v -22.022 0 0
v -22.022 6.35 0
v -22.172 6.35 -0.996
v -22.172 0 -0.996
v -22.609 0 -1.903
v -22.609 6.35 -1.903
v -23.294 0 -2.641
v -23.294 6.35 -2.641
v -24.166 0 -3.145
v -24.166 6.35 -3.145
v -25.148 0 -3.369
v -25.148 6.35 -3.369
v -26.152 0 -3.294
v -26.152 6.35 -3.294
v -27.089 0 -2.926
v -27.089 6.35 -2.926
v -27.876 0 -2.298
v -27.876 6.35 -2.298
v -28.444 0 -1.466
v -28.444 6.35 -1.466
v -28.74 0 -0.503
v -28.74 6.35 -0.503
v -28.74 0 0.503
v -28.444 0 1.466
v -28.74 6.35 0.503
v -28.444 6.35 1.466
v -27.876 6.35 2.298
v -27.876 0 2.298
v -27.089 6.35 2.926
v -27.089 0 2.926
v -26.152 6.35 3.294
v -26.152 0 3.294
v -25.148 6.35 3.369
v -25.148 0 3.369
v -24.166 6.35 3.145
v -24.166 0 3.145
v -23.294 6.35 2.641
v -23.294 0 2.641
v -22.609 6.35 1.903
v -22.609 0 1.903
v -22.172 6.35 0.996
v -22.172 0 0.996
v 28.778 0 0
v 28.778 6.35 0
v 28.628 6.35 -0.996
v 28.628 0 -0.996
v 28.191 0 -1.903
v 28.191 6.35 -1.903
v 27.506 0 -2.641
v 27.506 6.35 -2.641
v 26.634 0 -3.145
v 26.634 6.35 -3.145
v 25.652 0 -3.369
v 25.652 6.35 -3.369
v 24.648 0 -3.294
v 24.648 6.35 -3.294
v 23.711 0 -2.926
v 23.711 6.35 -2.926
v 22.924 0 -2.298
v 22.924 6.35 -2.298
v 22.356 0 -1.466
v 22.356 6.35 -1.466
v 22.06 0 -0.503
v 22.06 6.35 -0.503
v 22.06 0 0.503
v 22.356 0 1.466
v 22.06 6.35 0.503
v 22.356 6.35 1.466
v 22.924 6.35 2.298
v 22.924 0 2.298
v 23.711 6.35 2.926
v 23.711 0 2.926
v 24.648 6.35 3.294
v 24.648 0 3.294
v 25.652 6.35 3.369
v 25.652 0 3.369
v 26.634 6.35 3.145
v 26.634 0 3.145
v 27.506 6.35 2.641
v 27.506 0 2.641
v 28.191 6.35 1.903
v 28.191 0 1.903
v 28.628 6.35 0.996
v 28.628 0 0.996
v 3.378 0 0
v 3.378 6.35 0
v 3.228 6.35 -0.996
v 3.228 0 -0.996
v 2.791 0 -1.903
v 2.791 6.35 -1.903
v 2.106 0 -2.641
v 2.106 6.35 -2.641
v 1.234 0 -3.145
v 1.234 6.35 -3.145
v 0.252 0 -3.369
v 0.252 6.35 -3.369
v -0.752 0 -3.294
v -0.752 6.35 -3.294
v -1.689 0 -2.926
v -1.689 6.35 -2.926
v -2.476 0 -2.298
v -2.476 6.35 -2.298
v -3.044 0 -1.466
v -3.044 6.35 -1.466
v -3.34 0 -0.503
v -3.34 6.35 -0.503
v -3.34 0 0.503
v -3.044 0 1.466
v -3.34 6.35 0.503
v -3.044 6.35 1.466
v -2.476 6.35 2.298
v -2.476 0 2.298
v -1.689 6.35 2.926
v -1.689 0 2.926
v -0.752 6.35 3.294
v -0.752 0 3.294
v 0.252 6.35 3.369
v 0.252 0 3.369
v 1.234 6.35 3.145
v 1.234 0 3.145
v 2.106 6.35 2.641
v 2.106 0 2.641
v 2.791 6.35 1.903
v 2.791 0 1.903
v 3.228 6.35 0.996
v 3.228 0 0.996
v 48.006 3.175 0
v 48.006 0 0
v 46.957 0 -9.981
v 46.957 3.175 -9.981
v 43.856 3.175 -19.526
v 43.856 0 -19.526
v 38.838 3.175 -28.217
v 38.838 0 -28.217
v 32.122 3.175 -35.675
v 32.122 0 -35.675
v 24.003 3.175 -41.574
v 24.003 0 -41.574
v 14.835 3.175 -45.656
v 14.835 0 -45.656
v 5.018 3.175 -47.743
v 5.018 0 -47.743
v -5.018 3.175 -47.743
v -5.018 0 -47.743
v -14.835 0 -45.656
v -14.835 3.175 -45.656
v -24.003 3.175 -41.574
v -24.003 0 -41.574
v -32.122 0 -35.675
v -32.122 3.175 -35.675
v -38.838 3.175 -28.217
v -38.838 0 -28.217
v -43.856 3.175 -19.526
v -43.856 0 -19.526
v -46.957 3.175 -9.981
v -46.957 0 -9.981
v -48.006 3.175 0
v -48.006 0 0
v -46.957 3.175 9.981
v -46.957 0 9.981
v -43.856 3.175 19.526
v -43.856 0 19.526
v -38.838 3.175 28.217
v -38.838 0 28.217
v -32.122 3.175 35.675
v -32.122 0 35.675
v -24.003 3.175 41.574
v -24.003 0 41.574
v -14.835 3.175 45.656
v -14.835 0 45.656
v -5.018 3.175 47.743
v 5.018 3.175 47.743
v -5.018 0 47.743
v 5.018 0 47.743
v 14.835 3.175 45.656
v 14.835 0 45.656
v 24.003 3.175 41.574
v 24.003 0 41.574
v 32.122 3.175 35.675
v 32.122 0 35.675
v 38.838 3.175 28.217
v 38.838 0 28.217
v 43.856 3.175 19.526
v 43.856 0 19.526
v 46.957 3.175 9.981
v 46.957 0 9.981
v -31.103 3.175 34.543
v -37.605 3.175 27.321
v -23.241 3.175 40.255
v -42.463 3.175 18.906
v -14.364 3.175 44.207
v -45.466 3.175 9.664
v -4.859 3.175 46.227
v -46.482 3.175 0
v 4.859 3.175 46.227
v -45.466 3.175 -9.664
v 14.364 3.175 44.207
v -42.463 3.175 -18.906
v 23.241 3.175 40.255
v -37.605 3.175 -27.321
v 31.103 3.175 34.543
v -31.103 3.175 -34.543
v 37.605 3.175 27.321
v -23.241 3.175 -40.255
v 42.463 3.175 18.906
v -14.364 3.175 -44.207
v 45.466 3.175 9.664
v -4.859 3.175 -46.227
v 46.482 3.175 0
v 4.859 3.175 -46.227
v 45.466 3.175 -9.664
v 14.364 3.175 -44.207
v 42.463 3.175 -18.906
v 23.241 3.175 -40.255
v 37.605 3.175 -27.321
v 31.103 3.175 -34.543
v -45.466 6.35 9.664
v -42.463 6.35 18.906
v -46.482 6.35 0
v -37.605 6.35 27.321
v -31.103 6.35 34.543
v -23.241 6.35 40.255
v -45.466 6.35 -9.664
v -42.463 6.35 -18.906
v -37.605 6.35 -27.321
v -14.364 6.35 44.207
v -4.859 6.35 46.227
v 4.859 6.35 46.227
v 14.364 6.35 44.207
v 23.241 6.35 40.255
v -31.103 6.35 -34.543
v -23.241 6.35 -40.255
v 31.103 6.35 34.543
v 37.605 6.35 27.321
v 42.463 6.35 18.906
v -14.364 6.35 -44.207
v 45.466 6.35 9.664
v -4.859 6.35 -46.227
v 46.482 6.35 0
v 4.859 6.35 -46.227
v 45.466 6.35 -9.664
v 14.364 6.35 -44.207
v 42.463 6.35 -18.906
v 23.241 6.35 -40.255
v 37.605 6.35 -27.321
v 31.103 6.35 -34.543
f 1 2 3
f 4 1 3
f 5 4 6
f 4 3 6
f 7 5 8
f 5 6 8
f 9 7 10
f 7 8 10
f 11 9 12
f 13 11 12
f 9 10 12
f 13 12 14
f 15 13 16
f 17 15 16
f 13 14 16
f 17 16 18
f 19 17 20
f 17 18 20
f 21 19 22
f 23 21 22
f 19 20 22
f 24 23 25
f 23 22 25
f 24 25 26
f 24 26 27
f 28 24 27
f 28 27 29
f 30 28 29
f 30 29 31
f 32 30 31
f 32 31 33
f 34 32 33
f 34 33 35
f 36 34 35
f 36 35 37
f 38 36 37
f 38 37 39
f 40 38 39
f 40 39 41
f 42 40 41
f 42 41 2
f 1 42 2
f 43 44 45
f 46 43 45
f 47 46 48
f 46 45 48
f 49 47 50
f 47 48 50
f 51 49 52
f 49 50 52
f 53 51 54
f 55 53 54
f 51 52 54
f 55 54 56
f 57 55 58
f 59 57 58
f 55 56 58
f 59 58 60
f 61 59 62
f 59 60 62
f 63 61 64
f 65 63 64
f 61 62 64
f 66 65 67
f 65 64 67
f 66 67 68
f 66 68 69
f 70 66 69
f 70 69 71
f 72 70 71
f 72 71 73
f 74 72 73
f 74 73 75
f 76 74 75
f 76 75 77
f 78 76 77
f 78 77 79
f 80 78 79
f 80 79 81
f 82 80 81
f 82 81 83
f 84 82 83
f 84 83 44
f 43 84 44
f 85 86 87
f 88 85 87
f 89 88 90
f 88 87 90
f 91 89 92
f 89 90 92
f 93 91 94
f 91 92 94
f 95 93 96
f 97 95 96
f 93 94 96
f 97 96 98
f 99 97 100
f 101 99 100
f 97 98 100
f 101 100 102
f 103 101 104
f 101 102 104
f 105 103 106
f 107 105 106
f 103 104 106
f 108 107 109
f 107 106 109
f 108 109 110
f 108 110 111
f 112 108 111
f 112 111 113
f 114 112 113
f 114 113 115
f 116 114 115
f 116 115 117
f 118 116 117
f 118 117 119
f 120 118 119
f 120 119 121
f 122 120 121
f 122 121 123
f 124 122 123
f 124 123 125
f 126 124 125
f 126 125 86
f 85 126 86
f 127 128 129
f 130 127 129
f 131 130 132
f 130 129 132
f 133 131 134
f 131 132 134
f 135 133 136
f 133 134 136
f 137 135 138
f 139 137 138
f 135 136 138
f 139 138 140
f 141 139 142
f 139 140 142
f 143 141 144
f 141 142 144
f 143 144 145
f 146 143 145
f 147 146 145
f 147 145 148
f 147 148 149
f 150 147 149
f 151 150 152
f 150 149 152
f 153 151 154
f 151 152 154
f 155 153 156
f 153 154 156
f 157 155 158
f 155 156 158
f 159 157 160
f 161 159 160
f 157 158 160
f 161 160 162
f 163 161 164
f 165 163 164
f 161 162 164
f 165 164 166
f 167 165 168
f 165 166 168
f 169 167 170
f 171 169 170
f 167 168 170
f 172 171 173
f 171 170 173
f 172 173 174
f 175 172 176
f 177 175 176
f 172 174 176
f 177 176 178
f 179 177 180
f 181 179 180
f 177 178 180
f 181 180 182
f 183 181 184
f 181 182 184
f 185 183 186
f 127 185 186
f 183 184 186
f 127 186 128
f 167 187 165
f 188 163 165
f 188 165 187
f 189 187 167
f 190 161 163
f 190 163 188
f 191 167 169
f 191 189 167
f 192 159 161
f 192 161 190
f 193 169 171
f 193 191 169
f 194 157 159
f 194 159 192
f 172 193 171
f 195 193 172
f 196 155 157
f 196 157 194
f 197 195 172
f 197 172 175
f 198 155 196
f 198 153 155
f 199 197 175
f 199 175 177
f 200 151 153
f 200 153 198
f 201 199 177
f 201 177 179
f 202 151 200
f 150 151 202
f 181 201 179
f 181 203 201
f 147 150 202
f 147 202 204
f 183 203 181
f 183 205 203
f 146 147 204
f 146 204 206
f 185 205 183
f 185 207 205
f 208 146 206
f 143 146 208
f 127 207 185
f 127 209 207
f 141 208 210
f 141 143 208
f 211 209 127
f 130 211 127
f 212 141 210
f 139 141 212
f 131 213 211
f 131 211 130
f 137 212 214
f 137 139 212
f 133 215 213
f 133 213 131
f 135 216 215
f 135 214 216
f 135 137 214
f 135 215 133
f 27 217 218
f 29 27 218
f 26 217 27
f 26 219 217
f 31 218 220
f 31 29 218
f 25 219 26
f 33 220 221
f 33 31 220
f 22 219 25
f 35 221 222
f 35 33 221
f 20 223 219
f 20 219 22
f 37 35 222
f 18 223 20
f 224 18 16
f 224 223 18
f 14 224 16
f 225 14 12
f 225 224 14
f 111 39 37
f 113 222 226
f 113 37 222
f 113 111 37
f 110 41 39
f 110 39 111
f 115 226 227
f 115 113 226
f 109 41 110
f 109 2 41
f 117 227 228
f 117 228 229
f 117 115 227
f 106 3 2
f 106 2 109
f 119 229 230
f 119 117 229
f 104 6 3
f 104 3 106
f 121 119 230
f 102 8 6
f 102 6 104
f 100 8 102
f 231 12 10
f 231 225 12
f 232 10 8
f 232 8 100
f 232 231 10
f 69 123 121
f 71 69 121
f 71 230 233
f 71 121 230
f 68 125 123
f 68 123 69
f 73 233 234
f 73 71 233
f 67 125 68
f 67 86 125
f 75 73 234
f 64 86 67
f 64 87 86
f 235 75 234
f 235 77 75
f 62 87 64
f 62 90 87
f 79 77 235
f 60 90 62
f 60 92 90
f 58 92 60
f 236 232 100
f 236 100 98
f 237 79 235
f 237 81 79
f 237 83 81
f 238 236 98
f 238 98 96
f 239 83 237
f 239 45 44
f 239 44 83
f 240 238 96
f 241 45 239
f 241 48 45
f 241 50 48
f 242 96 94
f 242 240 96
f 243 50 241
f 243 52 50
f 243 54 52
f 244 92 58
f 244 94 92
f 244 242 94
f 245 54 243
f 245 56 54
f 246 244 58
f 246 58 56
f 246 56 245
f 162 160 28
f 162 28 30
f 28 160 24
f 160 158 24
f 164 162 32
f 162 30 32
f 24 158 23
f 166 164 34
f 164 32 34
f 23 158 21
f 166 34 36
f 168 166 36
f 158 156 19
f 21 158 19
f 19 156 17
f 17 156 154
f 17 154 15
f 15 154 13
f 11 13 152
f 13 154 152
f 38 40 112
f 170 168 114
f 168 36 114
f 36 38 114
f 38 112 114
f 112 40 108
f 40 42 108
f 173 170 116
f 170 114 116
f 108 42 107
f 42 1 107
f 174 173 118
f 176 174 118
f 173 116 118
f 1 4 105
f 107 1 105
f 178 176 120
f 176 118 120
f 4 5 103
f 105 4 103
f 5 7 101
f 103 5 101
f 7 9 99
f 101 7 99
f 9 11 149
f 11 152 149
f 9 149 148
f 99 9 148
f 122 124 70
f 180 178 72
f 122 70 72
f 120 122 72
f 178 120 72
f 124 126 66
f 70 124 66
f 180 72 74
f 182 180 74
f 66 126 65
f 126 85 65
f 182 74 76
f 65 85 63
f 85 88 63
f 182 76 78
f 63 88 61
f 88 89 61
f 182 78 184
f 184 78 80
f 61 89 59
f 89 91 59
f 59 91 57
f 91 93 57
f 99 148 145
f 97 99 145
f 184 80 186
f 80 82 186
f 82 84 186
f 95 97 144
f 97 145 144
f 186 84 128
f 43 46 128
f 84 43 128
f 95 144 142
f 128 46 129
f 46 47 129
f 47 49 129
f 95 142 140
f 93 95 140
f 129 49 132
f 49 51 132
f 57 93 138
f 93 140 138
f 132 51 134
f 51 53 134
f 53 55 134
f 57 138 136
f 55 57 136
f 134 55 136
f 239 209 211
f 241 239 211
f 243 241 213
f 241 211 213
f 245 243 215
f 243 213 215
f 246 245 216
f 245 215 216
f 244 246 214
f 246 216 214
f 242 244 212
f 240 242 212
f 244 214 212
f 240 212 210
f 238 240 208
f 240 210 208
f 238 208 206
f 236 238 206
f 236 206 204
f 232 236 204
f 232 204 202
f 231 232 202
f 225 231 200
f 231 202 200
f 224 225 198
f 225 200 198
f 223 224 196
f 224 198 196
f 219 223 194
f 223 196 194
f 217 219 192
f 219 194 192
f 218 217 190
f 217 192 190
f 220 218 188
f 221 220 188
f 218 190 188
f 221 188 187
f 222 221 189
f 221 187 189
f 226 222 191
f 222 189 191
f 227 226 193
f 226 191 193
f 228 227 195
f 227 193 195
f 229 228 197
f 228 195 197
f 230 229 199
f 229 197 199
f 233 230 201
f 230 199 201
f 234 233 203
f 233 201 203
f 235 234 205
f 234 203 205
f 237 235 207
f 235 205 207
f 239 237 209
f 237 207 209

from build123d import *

# Parameters (mm, degrees)
SKETCH1_R                   = 48.006
BOSS_EXTRUDE1_DEPTH         = 3.175
SKETCH2_R                   = 46.482
BOSS_EXTRUDE2_DEPTH         = 3.175
F_1_4_CLEARANCE_HOLE1_D     = 6.7564
F_1_4_CLEARANCE_HOLE1_DEPTH = 48.770172657
F_1_4_CLEARANCE_HOLE1_TIP   = 2.029827343


with BuildPart() as part:
    # Sketch1 → Boss-Extrude1 (new body)
    with BuildSketch(Plane(origin=(0, 0, 0), x_dir=(1, 0, 0), z_dir=(0, 1, 0))):
        Circle(SKETCH1_R)
    extrude(amount=BOSS_EXTRUDE1_DEPTH)

    # Sketch2 → Boss-Extrude2 (add)
    with BuildSketch(Plane(origin=(0, 3.175, 0), x_dir=(1, 0, 0), z_dir=(0, 1, 0))):
        Circle(SKETCH2_R)
    extrude(amount=BOSS_EXTRUDE2_DEPTH)

    # 1/4 Clearance Hole1
    with Locations(Plane(origin=(0, 0, 0), x_dir=(-1, 0, 0), z_dir=(0, -1, 0))):
        with Locations((-25.4, 0), (0, 0), (25.4, 0)):
            Hole(F_1_4_CLEARANCE_HOLE1_D / 2, depth=F_1_4_CLEARANCE_HOLE1_DEPTH)
            with Locations((0, 0, -(F_1_4_CLEARANCE_HOLE1_DEPTH + F_1_4_CLEARANCE_HOLE1_TIP / 2))):  # 118° drill point
                Cone(0, F_1_4_CLEARANCE_HOLE1_D / 2, F_1_4_CLEARANCE_HOLE1_TIP, mode=Mode.SUBTRACT)


solid = part.part
